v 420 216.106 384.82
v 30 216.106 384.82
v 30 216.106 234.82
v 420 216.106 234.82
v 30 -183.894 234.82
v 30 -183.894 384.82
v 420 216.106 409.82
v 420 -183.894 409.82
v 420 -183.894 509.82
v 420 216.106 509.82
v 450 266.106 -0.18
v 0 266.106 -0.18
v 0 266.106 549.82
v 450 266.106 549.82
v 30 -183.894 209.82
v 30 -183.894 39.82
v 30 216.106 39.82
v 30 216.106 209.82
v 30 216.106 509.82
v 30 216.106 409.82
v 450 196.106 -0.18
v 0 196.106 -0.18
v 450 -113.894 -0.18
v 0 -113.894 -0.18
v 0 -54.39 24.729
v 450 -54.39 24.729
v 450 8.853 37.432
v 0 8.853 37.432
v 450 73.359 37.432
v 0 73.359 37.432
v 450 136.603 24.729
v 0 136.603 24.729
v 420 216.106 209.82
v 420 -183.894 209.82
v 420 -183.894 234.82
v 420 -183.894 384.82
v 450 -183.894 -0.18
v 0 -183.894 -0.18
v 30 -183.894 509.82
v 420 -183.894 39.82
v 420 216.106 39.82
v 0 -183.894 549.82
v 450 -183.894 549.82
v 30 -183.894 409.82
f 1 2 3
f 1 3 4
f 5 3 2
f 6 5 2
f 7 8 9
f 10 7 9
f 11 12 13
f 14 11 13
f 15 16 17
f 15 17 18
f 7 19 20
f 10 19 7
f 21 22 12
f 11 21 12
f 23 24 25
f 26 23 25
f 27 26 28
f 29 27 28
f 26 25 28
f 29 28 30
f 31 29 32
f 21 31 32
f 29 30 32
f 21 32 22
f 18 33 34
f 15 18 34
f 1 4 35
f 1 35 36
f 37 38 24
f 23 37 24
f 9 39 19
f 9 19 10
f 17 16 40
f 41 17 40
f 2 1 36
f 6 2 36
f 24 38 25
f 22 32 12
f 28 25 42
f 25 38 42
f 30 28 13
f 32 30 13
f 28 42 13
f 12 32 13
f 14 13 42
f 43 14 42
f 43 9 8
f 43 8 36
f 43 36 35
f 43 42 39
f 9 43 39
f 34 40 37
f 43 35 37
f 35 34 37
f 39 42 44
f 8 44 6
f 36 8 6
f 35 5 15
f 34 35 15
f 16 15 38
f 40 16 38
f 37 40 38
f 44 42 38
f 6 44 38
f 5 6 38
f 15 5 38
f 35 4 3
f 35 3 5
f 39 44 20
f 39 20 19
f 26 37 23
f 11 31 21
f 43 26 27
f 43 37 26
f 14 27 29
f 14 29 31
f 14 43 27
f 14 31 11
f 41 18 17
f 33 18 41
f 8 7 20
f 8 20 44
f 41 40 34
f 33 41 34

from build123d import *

# Parameters (mm, degrees)
F1_DEPTH = 450
F2_W     = 390
F2_H     = 470
F3_DEPTH = 400
F4_W     = 400
F4_H     = 25
F5_DEPTH = 390
F6_W     = 400
F6_H     = 25
F7_DEPTH = 390


with BuildPart() as f1:
    # F0 (on Right) → F1 (new body)
    with BuildSketch(Plane.YZ):
        with BuildLine():
            Line((266.10621, -0.179865), (266.10621, 549.820135))
            Line((266.10621, 549.820135), (-183.89379, 549.820135))
            Line((-183.89379, 549.820135), (-183.89379, -0.179865))
            Line((-183.89379, -0.179865), (-113.89379, -0.179865))
            ThreePointArc((-113.89379, -0.179865), (41.10621, 39.031723), (196.10621, -0.179865))
            Line((196.10621, -0.179865), (266.10621, -0.179865))
        make_face()
    extrude(amount=F1_DEPTH)

    # F2 (on face) → F3 (cut)
    with BuildSketch(Plane.XZ.offset(183.89379)):
        with Locations((225, 274.820135)):
            Rectangle(F2_W, F2_H)
    extrude(amount=-F3_DEPTH, mode=Mode.SUBTRACT)

    # F4 (on face) → F5 (join)
    with BuildSketch(Plane(origin=(420, 0, 0), x_dir=(0, -1, 0), z_dir=(-1, 0, 0))):
        with Locations((-16.10621, 397.320135)):
            Rectangle(F4_W, F4_H)
    extrude(amount=F5_DEPTH)

    # F6 (on face) → F7 (join)
    with BuildSketch(Plane(origin=(420, 0, 0), x_dir=(0, -1, 0), z_dir=(-1, 0, 0))):
        with Locations((-16.10621, 222.320135)):
            Rectangle(F6_W, F6_H)
    extrude(amount=F7_DEPTH)


solid = f1.part
